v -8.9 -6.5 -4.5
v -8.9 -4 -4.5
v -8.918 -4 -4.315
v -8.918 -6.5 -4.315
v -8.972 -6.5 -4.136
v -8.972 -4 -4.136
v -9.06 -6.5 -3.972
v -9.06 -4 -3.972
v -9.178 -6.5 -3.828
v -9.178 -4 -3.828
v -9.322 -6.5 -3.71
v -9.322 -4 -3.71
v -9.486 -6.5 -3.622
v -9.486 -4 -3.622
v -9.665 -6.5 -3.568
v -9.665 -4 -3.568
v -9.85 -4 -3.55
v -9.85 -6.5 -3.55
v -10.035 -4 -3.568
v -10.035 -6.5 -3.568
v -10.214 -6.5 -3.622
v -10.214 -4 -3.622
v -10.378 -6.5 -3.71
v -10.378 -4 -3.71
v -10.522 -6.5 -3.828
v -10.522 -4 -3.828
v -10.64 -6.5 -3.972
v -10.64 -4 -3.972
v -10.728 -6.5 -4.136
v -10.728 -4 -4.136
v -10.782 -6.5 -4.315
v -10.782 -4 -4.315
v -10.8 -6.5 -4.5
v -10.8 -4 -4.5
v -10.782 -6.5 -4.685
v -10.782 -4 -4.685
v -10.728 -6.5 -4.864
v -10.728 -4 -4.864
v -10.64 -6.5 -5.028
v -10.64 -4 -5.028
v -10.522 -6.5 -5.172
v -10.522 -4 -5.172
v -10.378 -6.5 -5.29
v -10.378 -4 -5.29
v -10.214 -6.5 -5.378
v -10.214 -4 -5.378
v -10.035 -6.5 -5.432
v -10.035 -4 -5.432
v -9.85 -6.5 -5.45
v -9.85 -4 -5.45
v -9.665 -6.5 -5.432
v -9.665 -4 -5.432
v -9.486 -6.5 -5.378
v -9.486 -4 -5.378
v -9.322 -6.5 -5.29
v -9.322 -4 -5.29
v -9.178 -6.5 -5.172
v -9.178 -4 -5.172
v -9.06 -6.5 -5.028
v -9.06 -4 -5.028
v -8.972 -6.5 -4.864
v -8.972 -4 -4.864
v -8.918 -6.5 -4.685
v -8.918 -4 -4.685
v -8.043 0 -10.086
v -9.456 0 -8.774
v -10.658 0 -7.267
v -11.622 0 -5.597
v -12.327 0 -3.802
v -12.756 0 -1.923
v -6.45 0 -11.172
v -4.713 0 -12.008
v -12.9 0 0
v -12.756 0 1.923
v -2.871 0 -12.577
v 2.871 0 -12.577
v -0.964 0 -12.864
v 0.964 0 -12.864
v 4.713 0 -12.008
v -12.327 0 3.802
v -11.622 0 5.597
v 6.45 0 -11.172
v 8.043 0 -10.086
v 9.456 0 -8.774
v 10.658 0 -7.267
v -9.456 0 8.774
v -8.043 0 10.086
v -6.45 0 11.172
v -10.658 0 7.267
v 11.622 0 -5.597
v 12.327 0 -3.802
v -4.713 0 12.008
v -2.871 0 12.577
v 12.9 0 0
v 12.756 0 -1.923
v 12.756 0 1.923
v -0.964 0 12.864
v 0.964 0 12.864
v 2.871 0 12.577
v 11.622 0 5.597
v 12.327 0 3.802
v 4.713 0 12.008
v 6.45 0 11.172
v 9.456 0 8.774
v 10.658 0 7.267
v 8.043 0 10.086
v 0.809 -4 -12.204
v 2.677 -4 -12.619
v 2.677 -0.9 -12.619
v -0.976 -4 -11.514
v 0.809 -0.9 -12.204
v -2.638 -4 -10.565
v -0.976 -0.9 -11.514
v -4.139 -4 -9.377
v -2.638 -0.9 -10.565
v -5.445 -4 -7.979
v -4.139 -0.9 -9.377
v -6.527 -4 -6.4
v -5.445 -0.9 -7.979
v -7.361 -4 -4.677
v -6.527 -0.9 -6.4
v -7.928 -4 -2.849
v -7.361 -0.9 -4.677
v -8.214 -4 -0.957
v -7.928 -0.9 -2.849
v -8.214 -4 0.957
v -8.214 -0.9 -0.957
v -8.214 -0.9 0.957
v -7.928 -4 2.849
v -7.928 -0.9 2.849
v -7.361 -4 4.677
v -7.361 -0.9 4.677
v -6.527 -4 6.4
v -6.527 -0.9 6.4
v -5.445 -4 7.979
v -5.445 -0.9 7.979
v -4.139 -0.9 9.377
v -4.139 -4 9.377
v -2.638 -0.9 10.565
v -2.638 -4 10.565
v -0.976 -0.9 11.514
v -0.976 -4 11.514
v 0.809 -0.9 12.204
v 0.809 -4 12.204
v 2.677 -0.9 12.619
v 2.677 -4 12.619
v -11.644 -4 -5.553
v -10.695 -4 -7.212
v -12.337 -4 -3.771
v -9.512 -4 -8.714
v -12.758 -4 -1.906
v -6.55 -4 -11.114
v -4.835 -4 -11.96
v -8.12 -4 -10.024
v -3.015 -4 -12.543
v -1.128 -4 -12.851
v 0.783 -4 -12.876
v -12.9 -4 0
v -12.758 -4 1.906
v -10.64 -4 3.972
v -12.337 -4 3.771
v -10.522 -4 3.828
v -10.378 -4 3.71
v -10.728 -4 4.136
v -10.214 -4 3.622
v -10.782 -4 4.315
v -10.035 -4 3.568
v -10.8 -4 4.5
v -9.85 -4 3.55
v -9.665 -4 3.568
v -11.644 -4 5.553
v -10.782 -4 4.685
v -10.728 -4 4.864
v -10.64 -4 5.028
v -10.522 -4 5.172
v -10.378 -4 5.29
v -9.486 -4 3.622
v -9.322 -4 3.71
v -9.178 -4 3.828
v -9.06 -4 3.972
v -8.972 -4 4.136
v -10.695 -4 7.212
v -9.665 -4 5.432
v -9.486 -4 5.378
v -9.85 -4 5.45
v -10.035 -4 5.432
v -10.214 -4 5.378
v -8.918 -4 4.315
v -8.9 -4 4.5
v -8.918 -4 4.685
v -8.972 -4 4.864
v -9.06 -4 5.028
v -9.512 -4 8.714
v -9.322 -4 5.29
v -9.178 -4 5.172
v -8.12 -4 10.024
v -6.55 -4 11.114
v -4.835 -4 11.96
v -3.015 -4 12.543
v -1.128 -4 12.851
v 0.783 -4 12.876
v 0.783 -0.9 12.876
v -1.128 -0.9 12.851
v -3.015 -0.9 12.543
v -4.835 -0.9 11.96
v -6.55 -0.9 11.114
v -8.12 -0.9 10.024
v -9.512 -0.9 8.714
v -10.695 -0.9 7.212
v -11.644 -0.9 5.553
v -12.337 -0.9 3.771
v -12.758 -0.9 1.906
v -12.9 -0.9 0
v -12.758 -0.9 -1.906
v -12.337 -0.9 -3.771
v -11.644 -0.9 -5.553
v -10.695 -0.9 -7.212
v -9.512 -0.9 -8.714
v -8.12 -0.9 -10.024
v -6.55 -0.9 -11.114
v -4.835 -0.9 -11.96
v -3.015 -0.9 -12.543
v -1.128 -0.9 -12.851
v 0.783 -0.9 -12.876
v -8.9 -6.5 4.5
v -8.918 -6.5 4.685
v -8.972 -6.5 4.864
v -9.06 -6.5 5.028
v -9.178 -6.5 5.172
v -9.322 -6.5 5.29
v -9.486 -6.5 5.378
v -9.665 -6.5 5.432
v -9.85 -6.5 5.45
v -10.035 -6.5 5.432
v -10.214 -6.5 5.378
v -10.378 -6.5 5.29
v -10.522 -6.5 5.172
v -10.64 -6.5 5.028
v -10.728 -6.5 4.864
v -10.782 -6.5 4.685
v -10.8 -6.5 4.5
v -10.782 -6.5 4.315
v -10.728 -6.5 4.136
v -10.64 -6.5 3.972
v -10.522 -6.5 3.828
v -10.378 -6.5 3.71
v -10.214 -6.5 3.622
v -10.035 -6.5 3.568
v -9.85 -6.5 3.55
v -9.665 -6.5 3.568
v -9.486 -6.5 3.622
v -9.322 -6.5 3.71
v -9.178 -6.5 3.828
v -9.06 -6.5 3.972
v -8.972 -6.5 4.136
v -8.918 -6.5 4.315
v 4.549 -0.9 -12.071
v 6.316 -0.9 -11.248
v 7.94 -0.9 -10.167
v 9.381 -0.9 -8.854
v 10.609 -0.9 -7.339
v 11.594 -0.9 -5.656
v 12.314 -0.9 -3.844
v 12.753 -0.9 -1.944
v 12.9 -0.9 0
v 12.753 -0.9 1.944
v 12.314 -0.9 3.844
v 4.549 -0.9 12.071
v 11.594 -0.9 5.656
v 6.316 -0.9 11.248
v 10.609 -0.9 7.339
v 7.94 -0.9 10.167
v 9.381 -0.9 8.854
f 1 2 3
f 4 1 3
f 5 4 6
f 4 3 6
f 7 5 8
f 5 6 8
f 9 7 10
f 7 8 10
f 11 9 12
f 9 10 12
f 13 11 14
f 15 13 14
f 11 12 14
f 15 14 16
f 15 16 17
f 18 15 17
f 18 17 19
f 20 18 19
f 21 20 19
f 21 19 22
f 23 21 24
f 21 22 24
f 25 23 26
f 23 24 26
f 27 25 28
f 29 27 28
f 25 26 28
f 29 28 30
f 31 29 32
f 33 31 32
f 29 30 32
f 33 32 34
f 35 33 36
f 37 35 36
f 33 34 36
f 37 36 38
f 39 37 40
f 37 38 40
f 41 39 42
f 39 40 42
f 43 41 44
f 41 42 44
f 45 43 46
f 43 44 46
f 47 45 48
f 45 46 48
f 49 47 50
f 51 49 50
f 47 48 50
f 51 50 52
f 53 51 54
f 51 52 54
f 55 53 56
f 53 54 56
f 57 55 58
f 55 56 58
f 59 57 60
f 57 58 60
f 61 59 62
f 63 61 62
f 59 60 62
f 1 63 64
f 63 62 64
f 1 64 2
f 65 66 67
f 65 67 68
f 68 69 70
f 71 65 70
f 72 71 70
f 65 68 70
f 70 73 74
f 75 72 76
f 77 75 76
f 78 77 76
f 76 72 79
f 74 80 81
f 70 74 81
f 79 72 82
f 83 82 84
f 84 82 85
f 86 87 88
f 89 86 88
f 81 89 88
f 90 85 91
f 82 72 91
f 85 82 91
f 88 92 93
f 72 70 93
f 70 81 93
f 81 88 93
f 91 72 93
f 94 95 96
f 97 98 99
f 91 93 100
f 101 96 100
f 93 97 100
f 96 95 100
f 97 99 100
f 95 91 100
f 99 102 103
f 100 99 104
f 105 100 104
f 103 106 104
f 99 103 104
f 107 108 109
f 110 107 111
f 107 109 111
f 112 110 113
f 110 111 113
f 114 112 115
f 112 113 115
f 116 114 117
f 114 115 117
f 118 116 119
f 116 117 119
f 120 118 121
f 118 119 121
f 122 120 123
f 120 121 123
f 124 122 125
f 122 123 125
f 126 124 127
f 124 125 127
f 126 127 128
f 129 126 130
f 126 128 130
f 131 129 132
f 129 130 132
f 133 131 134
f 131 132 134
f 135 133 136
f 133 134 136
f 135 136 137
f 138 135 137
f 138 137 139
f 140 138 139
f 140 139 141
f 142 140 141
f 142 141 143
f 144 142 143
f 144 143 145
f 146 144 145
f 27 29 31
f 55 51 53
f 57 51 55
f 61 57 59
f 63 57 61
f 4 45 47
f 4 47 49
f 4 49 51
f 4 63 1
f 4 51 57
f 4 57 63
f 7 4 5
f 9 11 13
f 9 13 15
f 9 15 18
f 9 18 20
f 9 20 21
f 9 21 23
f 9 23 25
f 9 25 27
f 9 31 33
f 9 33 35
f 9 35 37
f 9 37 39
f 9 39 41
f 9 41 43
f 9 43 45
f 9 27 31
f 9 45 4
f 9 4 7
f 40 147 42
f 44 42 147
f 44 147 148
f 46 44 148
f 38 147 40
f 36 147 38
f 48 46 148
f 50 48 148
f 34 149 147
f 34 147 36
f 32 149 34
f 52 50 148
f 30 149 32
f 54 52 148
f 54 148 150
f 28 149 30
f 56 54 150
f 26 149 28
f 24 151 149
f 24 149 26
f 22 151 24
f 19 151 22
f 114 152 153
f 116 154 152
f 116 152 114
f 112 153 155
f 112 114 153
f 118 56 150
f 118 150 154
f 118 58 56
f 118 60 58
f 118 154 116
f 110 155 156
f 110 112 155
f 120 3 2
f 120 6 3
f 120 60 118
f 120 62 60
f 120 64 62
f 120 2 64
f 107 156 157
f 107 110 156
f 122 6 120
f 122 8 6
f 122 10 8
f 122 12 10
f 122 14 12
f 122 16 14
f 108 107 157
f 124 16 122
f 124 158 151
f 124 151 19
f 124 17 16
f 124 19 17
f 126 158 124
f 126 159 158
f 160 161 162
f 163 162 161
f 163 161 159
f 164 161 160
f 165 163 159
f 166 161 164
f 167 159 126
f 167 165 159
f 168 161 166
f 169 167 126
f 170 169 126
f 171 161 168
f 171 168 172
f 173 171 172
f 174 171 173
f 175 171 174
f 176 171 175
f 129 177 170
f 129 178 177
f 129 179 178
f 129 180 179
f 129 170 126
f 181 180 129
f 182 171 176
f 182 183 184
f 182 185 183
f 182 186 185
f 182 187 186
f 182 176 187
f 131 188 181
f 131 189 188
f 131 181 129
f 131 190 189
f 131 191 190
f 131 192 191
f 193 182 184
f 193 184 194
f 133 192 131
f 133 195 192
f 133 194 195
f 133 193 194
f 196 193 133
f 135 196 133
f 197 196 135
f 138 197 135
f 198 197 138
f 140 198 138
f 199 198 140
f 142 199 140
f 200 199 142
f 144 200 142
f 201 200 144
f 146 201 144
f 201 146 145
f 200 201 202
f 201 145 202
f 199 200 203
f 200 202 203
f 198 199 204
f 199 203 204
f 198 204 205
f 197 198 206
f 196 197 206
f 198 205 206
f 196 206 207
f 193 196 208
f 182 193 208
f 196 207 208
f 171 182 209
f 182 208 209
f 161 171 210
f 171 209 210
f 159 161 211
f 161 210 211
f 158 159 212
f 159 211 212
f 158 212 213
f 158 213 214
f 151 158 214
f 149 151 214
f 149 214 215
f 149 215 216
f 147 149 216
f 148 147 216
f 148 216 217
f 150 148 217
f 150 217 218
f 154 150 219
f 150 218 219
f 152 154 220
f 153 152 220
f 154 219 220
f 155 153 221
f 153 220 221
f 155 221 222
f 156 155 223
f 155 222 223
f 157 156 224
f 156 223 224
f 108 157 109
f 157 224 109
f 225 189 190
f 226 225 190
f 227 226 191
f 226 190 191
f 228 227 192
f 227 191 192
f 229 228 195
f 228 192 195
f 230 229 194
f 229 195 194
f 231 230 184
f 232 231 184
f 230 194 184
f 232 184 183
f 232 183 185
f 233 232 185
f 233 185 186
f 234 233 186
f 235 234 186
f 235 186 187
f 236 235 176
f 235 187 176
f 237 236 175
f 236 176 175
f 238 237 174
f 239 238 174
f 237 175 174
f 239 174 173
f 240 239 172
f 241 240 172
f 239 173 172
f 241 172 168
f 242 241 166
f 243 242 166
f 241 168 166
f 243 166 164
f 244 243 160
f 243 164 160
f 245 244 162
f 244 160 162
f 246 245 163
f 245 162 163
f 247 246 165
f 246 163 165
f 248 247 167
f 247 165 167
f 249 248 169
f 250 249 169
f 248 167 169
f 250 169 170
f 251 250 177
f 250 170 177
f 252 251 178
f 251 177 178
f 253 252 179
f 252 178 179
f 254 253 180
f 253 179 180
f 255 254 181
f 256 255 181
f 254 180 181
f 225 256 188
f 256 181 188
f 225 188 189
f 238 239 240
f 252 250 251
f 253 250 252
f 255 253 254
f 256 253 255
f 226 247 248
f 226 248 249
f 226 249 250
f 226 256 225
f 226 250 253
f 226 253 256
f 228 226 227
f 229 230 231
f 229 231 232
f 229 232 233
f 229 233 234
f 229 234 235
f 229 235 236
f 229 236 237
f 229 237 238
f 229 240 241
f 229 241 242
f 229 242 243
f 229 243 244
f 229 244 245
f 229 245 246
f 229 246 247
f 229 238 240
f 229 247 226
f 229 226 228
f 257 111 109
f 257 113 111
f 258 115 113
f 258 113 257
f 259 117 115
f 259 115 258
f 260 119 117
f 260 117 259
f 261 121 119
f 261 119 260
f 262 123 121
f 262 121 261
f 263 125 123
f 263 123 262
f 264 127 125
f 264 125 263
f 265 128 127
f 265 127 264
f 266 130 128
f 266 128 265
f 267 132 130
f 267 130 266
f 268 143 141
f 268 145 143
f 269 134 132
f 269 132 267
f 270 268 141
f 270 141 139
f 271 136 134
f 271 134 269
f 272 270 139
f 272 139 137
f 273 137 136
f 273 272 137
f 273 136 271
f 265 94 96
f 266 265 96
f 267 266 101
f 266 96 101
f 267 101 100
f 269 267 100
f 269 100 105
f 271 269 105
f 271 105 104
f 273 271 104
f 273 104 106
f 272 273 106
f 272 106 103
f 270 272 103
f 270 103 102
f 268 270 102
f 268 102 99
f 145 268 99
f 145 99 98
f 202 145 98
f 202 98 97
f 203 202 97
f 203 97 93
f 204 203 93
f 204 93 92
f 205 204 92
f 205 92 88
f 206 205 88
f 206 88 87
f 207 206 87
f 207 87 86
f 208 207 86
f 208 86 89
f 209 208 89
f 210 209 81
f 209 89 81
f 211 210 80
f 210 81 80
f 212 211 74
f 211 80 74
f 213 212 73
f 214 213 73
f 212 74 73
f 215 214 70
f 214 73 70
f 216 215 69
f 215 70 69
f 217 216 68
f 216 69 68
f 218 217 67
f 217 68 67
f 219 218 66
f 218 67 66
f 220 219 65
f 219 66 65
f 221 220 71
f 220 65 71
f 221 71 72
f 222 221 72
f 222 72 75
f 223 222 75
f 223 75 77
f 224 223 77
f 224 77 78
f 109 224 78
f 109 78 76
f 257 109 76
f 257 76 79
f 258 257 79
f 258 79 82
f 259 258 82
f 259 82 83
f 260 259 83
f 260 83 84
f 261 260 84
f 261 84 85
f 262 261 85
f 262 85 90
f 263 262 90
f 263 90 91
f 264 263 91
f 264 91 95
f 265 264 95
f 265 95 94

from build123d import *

# Parameters (mm, degrees)
F0_R     = 12.9
F1_DEPTH = 0.9
F3_DEPTH = 3.1
F4_R     = 0.95
F5_DEPTH = 2.5


with BuildPart() as f1:
    # F0 (on Front) → F1 (new body)
    with BuildSketch(Plane.XZ):
        Circle(F0_R)
    extrude(amount=F1_DEPTH)

    # F2 (on face) → F3 (join)
    with BuildSketch(Plane.XZ.offset(0.9)):
        with BuildLine():
            ThreePointArc((2.6775, -12.619073), (-8.25, 0), (2.6775, 12.619073))
            ThreePointArc((2.6775, 12.619073), (-12.9, 0), (2.6775, -12.619073))
        make_face()
    extrude(amount=F3_DEPTH)

    # F4 (on face) → F5 (join)
    with BuildSketch(Plane.XZ.offset(4)):
        with Locations((-9.85, 4.5)):
            Circle(F4_R)
        with Locations((-9.85, -4.5)):
            Circle(F4_R)
    extrude(amount=F5_DEPTH)


solid = f1.part
